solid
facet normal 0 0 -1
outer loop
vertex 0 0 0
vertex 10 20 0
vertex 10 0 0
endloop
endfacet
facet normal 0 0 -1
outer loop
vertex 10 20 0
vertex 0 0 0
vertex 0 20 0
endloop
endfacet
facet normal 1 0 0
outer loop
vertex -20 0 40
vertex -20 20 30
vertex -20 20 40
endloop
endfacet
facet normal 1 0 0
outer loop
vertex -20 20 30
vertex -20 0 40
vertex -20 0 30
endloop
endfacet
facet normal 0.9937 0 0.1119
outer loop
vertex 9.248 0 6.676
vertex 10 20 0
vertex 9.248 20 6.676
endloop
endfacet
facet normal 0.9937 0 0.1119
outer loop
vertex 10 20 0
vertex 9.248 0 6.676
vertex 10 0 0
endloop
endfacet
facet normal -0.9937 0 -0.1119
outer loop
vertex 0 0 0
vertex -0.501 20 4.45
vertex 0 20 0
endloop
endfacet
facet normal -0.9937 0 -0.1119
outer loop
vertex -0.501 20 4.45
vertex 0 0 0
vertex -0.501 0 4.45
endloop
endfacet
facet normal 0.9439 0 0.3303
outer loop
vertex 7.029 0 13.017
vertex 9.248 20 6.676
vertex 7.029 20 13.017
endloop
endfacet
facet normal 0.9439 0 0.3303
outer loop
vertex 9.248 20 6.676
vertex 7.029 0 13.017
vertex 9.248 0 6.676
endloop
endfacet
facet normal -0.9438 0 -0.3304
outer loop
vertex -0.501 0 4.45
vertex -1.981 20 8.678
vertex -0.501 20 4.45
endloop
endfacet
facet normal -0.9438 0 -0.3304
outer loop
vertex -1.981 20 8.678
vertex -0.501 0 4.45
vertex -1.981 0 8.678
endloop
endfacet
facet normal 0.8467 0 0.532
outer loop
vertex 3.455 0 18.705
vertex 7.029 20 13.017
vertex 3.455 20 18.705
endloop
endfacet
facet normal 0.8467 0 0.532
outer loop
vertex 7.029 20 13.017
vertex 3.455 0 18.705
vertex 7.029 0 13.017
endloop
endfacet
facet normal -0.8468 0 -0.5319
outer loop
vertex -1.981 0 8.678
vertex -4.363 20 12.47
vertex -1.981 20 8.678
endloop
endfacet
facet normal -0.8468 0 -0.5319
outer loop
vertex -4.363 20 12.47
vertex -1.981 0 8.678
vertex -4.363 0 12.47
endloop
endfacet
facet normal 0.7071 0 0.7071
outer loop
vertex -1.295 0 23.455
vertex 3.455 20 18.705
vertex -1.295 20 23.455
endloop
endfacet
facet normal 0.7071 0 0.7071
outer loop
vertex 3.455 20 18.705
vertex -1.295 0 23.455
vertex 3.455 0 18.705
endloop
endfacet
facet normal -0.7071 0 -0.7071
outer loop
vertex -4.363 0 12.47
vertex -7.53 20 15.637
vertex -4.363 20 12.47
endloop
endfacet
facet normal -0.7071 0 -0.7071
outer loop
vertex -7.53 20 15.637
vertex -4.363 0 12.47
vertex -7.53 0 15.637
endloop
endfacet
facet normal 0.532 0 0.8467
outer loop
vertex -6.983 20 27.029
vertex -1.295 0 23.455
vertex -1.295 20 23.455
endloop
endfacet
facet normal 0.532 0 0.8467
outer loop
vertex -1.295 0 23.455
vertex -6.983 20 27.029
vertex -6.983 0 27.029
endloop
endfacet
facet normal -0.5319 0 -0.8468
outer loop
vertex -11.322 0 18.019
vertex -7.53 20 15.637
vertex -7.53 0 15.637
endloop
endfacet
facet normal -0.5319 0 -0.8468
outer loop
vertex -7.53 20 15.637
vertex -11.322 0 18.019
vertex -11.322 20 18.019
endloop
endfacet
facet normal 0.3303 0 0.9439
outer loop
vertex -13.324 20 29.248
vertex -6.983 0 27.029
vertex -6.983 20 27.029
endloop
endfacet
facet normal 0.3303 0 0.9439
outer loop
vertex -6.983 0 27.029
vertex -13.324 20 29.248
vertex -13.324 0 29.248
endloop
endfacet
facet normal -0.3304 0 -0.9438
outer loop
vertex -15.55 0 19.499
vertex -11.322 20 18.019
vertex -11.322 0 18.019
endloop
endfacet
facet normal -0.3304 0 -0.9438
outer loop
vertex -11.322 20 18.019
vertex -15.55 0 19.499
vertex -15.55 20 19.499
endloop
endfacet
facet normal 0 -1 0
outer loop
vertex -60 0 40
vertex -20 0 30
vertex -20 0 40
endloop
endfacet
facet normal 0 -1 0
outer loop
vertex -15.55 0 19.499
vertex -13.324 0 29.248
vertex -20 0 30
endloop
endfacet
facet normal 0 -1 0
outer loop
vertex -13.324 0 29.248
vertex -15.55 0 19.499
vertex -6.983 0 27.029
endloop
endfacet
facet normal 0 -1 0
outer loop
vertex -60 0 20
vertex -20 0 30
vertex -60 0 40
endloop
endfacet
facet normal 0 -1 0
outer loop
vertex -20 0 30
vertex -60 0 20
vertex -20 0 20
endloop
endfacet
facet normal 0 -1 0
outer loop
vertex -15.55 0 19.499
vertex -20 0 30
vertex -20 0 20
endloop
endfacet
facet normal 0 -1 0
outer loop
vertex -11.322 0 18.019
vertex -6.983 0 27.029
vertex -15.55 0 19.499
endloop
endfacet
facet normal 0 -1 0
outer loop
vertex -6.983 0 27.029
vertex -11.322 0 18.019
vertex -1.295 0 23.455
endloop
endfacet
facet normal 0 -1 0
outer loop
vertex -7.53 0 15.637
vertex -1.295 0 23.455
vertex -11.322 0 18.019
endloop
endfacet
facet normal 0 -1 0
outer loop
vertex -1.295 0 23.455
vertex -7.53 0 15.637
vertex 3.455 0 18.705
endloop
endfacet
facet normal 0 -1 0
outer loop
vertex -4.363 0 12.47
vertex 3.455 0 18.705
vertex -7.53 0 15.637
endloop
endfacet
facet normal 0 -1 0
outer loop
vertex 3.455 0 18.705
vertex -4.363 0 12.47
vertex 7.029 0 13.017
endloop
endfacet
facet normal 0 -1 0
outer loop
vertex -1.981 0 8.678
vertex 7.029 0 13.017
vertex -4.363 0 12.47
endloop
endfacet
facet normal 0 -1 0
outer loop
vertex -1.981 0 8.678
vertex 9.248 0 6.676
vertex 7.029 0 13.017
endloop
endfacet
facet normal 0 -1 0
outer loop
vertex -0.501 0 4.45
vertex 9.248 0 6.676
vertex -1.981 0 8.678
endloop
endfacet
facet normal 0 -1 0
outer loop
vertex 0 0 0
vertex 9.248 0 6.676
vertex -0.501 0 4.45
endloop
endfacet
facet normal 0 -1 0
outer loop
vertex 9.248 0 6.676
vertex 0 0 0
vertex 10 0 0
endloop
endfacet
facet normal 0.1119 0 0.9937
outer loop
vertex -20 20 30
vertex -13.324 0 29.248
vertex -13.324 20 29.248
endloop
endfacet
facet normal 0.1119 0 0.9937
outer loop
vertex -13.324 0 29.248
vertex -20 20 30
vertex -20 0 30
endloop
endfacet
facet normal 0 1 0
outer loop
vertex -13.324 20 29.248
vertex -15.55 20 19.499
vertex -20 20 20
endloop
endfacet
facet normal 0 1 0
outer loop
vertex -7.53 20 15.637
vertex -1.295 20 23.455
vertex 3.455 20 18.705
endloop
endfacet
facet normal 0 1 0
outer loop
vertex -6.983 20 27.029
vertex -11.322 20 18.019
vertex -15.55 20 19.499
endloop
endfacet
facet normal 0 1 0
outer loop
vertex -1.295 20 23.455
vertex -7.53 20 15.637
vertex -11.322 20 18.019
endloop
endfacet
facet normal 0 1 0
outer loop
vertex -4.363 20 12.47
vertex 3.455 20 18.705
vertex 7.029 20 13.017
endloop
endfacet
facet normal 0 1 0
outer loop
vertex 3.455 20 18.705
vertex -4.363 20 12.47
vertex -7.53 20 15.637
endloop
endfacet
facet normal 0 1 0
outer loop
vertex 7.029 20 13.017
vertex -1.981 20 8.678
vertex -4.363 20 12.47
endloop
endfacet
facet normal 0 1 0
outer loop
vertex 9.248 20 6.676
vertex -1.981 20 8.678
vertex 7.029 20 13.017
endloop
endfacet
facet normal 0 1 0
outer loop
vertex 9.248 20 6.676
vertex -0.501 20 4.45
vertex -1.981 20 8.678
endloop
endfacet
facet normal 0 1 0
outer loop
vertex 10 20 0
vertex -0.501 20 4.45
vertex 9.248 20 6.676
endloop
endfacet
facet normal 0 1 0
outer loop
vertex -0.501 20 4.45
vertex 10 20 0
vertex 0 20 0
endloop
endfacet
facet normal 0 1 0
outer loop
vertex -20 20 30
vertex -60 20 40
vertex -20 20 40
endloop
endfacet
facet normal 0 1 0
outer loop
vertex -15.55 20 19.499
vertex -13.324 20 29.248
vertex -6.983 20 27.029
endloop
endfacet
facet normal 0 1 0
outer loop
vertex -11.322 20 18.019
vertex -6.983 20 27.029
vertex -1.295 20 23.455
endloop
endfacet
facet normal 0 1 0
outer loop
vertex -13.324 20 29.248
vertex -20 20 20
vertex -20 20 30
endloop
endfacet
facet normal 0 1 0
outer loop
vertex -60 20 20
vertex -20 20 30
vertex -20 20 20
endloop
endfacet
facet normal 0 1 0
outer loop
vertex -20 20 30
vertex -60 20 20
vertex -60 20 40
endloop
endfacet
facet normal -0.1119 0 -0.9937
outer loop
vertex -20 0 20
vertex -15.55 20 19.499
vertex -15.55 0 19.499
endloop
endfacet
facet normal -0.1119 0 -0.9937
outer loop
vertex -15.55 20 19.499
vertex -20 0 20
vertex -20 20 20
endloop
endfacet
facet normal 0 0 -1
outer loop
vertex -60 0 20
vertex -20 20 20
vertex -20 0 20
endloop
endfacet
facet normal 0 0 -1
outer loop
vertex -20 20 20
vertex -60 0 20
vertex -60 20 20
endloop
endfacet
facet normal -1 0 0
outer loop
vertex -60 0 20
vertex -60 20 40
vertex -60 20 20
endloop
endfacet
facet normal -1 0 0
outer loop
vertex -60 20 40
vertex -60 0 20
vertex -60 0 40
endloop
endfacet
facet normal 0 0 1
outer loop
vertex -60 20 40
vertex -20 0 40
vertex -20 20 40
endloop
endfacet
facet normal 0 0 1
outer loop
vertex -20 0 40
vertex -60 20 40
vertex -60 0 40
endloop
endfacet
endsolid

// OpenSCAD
// bent_cube([10, 20], 90, 20);
// rotate_to_bent_face(90, 20){
//     cube([20, 20, 40]);
// }

module bent_cube(size, angle, r){
    translate([0, size[1], 0])
        rotate([90, 0, 0])
            translate([-r, 0])
                rotate_extrude(convexity = 10, angle = angle){
                    translate([r, 0]){
                        square([size[0], size[1]]);
                    }
                }
}

module rotate_to_bent_face(angle, r){
    translate([-r, 0])
        rotate([0, -angle, 0])
            translate([r, 0])
                children();
}


bent_cube([10, 20], 90, 20);
rotate_to_bent_face(90, 20){
    cube([20, 20, 40]);
}
